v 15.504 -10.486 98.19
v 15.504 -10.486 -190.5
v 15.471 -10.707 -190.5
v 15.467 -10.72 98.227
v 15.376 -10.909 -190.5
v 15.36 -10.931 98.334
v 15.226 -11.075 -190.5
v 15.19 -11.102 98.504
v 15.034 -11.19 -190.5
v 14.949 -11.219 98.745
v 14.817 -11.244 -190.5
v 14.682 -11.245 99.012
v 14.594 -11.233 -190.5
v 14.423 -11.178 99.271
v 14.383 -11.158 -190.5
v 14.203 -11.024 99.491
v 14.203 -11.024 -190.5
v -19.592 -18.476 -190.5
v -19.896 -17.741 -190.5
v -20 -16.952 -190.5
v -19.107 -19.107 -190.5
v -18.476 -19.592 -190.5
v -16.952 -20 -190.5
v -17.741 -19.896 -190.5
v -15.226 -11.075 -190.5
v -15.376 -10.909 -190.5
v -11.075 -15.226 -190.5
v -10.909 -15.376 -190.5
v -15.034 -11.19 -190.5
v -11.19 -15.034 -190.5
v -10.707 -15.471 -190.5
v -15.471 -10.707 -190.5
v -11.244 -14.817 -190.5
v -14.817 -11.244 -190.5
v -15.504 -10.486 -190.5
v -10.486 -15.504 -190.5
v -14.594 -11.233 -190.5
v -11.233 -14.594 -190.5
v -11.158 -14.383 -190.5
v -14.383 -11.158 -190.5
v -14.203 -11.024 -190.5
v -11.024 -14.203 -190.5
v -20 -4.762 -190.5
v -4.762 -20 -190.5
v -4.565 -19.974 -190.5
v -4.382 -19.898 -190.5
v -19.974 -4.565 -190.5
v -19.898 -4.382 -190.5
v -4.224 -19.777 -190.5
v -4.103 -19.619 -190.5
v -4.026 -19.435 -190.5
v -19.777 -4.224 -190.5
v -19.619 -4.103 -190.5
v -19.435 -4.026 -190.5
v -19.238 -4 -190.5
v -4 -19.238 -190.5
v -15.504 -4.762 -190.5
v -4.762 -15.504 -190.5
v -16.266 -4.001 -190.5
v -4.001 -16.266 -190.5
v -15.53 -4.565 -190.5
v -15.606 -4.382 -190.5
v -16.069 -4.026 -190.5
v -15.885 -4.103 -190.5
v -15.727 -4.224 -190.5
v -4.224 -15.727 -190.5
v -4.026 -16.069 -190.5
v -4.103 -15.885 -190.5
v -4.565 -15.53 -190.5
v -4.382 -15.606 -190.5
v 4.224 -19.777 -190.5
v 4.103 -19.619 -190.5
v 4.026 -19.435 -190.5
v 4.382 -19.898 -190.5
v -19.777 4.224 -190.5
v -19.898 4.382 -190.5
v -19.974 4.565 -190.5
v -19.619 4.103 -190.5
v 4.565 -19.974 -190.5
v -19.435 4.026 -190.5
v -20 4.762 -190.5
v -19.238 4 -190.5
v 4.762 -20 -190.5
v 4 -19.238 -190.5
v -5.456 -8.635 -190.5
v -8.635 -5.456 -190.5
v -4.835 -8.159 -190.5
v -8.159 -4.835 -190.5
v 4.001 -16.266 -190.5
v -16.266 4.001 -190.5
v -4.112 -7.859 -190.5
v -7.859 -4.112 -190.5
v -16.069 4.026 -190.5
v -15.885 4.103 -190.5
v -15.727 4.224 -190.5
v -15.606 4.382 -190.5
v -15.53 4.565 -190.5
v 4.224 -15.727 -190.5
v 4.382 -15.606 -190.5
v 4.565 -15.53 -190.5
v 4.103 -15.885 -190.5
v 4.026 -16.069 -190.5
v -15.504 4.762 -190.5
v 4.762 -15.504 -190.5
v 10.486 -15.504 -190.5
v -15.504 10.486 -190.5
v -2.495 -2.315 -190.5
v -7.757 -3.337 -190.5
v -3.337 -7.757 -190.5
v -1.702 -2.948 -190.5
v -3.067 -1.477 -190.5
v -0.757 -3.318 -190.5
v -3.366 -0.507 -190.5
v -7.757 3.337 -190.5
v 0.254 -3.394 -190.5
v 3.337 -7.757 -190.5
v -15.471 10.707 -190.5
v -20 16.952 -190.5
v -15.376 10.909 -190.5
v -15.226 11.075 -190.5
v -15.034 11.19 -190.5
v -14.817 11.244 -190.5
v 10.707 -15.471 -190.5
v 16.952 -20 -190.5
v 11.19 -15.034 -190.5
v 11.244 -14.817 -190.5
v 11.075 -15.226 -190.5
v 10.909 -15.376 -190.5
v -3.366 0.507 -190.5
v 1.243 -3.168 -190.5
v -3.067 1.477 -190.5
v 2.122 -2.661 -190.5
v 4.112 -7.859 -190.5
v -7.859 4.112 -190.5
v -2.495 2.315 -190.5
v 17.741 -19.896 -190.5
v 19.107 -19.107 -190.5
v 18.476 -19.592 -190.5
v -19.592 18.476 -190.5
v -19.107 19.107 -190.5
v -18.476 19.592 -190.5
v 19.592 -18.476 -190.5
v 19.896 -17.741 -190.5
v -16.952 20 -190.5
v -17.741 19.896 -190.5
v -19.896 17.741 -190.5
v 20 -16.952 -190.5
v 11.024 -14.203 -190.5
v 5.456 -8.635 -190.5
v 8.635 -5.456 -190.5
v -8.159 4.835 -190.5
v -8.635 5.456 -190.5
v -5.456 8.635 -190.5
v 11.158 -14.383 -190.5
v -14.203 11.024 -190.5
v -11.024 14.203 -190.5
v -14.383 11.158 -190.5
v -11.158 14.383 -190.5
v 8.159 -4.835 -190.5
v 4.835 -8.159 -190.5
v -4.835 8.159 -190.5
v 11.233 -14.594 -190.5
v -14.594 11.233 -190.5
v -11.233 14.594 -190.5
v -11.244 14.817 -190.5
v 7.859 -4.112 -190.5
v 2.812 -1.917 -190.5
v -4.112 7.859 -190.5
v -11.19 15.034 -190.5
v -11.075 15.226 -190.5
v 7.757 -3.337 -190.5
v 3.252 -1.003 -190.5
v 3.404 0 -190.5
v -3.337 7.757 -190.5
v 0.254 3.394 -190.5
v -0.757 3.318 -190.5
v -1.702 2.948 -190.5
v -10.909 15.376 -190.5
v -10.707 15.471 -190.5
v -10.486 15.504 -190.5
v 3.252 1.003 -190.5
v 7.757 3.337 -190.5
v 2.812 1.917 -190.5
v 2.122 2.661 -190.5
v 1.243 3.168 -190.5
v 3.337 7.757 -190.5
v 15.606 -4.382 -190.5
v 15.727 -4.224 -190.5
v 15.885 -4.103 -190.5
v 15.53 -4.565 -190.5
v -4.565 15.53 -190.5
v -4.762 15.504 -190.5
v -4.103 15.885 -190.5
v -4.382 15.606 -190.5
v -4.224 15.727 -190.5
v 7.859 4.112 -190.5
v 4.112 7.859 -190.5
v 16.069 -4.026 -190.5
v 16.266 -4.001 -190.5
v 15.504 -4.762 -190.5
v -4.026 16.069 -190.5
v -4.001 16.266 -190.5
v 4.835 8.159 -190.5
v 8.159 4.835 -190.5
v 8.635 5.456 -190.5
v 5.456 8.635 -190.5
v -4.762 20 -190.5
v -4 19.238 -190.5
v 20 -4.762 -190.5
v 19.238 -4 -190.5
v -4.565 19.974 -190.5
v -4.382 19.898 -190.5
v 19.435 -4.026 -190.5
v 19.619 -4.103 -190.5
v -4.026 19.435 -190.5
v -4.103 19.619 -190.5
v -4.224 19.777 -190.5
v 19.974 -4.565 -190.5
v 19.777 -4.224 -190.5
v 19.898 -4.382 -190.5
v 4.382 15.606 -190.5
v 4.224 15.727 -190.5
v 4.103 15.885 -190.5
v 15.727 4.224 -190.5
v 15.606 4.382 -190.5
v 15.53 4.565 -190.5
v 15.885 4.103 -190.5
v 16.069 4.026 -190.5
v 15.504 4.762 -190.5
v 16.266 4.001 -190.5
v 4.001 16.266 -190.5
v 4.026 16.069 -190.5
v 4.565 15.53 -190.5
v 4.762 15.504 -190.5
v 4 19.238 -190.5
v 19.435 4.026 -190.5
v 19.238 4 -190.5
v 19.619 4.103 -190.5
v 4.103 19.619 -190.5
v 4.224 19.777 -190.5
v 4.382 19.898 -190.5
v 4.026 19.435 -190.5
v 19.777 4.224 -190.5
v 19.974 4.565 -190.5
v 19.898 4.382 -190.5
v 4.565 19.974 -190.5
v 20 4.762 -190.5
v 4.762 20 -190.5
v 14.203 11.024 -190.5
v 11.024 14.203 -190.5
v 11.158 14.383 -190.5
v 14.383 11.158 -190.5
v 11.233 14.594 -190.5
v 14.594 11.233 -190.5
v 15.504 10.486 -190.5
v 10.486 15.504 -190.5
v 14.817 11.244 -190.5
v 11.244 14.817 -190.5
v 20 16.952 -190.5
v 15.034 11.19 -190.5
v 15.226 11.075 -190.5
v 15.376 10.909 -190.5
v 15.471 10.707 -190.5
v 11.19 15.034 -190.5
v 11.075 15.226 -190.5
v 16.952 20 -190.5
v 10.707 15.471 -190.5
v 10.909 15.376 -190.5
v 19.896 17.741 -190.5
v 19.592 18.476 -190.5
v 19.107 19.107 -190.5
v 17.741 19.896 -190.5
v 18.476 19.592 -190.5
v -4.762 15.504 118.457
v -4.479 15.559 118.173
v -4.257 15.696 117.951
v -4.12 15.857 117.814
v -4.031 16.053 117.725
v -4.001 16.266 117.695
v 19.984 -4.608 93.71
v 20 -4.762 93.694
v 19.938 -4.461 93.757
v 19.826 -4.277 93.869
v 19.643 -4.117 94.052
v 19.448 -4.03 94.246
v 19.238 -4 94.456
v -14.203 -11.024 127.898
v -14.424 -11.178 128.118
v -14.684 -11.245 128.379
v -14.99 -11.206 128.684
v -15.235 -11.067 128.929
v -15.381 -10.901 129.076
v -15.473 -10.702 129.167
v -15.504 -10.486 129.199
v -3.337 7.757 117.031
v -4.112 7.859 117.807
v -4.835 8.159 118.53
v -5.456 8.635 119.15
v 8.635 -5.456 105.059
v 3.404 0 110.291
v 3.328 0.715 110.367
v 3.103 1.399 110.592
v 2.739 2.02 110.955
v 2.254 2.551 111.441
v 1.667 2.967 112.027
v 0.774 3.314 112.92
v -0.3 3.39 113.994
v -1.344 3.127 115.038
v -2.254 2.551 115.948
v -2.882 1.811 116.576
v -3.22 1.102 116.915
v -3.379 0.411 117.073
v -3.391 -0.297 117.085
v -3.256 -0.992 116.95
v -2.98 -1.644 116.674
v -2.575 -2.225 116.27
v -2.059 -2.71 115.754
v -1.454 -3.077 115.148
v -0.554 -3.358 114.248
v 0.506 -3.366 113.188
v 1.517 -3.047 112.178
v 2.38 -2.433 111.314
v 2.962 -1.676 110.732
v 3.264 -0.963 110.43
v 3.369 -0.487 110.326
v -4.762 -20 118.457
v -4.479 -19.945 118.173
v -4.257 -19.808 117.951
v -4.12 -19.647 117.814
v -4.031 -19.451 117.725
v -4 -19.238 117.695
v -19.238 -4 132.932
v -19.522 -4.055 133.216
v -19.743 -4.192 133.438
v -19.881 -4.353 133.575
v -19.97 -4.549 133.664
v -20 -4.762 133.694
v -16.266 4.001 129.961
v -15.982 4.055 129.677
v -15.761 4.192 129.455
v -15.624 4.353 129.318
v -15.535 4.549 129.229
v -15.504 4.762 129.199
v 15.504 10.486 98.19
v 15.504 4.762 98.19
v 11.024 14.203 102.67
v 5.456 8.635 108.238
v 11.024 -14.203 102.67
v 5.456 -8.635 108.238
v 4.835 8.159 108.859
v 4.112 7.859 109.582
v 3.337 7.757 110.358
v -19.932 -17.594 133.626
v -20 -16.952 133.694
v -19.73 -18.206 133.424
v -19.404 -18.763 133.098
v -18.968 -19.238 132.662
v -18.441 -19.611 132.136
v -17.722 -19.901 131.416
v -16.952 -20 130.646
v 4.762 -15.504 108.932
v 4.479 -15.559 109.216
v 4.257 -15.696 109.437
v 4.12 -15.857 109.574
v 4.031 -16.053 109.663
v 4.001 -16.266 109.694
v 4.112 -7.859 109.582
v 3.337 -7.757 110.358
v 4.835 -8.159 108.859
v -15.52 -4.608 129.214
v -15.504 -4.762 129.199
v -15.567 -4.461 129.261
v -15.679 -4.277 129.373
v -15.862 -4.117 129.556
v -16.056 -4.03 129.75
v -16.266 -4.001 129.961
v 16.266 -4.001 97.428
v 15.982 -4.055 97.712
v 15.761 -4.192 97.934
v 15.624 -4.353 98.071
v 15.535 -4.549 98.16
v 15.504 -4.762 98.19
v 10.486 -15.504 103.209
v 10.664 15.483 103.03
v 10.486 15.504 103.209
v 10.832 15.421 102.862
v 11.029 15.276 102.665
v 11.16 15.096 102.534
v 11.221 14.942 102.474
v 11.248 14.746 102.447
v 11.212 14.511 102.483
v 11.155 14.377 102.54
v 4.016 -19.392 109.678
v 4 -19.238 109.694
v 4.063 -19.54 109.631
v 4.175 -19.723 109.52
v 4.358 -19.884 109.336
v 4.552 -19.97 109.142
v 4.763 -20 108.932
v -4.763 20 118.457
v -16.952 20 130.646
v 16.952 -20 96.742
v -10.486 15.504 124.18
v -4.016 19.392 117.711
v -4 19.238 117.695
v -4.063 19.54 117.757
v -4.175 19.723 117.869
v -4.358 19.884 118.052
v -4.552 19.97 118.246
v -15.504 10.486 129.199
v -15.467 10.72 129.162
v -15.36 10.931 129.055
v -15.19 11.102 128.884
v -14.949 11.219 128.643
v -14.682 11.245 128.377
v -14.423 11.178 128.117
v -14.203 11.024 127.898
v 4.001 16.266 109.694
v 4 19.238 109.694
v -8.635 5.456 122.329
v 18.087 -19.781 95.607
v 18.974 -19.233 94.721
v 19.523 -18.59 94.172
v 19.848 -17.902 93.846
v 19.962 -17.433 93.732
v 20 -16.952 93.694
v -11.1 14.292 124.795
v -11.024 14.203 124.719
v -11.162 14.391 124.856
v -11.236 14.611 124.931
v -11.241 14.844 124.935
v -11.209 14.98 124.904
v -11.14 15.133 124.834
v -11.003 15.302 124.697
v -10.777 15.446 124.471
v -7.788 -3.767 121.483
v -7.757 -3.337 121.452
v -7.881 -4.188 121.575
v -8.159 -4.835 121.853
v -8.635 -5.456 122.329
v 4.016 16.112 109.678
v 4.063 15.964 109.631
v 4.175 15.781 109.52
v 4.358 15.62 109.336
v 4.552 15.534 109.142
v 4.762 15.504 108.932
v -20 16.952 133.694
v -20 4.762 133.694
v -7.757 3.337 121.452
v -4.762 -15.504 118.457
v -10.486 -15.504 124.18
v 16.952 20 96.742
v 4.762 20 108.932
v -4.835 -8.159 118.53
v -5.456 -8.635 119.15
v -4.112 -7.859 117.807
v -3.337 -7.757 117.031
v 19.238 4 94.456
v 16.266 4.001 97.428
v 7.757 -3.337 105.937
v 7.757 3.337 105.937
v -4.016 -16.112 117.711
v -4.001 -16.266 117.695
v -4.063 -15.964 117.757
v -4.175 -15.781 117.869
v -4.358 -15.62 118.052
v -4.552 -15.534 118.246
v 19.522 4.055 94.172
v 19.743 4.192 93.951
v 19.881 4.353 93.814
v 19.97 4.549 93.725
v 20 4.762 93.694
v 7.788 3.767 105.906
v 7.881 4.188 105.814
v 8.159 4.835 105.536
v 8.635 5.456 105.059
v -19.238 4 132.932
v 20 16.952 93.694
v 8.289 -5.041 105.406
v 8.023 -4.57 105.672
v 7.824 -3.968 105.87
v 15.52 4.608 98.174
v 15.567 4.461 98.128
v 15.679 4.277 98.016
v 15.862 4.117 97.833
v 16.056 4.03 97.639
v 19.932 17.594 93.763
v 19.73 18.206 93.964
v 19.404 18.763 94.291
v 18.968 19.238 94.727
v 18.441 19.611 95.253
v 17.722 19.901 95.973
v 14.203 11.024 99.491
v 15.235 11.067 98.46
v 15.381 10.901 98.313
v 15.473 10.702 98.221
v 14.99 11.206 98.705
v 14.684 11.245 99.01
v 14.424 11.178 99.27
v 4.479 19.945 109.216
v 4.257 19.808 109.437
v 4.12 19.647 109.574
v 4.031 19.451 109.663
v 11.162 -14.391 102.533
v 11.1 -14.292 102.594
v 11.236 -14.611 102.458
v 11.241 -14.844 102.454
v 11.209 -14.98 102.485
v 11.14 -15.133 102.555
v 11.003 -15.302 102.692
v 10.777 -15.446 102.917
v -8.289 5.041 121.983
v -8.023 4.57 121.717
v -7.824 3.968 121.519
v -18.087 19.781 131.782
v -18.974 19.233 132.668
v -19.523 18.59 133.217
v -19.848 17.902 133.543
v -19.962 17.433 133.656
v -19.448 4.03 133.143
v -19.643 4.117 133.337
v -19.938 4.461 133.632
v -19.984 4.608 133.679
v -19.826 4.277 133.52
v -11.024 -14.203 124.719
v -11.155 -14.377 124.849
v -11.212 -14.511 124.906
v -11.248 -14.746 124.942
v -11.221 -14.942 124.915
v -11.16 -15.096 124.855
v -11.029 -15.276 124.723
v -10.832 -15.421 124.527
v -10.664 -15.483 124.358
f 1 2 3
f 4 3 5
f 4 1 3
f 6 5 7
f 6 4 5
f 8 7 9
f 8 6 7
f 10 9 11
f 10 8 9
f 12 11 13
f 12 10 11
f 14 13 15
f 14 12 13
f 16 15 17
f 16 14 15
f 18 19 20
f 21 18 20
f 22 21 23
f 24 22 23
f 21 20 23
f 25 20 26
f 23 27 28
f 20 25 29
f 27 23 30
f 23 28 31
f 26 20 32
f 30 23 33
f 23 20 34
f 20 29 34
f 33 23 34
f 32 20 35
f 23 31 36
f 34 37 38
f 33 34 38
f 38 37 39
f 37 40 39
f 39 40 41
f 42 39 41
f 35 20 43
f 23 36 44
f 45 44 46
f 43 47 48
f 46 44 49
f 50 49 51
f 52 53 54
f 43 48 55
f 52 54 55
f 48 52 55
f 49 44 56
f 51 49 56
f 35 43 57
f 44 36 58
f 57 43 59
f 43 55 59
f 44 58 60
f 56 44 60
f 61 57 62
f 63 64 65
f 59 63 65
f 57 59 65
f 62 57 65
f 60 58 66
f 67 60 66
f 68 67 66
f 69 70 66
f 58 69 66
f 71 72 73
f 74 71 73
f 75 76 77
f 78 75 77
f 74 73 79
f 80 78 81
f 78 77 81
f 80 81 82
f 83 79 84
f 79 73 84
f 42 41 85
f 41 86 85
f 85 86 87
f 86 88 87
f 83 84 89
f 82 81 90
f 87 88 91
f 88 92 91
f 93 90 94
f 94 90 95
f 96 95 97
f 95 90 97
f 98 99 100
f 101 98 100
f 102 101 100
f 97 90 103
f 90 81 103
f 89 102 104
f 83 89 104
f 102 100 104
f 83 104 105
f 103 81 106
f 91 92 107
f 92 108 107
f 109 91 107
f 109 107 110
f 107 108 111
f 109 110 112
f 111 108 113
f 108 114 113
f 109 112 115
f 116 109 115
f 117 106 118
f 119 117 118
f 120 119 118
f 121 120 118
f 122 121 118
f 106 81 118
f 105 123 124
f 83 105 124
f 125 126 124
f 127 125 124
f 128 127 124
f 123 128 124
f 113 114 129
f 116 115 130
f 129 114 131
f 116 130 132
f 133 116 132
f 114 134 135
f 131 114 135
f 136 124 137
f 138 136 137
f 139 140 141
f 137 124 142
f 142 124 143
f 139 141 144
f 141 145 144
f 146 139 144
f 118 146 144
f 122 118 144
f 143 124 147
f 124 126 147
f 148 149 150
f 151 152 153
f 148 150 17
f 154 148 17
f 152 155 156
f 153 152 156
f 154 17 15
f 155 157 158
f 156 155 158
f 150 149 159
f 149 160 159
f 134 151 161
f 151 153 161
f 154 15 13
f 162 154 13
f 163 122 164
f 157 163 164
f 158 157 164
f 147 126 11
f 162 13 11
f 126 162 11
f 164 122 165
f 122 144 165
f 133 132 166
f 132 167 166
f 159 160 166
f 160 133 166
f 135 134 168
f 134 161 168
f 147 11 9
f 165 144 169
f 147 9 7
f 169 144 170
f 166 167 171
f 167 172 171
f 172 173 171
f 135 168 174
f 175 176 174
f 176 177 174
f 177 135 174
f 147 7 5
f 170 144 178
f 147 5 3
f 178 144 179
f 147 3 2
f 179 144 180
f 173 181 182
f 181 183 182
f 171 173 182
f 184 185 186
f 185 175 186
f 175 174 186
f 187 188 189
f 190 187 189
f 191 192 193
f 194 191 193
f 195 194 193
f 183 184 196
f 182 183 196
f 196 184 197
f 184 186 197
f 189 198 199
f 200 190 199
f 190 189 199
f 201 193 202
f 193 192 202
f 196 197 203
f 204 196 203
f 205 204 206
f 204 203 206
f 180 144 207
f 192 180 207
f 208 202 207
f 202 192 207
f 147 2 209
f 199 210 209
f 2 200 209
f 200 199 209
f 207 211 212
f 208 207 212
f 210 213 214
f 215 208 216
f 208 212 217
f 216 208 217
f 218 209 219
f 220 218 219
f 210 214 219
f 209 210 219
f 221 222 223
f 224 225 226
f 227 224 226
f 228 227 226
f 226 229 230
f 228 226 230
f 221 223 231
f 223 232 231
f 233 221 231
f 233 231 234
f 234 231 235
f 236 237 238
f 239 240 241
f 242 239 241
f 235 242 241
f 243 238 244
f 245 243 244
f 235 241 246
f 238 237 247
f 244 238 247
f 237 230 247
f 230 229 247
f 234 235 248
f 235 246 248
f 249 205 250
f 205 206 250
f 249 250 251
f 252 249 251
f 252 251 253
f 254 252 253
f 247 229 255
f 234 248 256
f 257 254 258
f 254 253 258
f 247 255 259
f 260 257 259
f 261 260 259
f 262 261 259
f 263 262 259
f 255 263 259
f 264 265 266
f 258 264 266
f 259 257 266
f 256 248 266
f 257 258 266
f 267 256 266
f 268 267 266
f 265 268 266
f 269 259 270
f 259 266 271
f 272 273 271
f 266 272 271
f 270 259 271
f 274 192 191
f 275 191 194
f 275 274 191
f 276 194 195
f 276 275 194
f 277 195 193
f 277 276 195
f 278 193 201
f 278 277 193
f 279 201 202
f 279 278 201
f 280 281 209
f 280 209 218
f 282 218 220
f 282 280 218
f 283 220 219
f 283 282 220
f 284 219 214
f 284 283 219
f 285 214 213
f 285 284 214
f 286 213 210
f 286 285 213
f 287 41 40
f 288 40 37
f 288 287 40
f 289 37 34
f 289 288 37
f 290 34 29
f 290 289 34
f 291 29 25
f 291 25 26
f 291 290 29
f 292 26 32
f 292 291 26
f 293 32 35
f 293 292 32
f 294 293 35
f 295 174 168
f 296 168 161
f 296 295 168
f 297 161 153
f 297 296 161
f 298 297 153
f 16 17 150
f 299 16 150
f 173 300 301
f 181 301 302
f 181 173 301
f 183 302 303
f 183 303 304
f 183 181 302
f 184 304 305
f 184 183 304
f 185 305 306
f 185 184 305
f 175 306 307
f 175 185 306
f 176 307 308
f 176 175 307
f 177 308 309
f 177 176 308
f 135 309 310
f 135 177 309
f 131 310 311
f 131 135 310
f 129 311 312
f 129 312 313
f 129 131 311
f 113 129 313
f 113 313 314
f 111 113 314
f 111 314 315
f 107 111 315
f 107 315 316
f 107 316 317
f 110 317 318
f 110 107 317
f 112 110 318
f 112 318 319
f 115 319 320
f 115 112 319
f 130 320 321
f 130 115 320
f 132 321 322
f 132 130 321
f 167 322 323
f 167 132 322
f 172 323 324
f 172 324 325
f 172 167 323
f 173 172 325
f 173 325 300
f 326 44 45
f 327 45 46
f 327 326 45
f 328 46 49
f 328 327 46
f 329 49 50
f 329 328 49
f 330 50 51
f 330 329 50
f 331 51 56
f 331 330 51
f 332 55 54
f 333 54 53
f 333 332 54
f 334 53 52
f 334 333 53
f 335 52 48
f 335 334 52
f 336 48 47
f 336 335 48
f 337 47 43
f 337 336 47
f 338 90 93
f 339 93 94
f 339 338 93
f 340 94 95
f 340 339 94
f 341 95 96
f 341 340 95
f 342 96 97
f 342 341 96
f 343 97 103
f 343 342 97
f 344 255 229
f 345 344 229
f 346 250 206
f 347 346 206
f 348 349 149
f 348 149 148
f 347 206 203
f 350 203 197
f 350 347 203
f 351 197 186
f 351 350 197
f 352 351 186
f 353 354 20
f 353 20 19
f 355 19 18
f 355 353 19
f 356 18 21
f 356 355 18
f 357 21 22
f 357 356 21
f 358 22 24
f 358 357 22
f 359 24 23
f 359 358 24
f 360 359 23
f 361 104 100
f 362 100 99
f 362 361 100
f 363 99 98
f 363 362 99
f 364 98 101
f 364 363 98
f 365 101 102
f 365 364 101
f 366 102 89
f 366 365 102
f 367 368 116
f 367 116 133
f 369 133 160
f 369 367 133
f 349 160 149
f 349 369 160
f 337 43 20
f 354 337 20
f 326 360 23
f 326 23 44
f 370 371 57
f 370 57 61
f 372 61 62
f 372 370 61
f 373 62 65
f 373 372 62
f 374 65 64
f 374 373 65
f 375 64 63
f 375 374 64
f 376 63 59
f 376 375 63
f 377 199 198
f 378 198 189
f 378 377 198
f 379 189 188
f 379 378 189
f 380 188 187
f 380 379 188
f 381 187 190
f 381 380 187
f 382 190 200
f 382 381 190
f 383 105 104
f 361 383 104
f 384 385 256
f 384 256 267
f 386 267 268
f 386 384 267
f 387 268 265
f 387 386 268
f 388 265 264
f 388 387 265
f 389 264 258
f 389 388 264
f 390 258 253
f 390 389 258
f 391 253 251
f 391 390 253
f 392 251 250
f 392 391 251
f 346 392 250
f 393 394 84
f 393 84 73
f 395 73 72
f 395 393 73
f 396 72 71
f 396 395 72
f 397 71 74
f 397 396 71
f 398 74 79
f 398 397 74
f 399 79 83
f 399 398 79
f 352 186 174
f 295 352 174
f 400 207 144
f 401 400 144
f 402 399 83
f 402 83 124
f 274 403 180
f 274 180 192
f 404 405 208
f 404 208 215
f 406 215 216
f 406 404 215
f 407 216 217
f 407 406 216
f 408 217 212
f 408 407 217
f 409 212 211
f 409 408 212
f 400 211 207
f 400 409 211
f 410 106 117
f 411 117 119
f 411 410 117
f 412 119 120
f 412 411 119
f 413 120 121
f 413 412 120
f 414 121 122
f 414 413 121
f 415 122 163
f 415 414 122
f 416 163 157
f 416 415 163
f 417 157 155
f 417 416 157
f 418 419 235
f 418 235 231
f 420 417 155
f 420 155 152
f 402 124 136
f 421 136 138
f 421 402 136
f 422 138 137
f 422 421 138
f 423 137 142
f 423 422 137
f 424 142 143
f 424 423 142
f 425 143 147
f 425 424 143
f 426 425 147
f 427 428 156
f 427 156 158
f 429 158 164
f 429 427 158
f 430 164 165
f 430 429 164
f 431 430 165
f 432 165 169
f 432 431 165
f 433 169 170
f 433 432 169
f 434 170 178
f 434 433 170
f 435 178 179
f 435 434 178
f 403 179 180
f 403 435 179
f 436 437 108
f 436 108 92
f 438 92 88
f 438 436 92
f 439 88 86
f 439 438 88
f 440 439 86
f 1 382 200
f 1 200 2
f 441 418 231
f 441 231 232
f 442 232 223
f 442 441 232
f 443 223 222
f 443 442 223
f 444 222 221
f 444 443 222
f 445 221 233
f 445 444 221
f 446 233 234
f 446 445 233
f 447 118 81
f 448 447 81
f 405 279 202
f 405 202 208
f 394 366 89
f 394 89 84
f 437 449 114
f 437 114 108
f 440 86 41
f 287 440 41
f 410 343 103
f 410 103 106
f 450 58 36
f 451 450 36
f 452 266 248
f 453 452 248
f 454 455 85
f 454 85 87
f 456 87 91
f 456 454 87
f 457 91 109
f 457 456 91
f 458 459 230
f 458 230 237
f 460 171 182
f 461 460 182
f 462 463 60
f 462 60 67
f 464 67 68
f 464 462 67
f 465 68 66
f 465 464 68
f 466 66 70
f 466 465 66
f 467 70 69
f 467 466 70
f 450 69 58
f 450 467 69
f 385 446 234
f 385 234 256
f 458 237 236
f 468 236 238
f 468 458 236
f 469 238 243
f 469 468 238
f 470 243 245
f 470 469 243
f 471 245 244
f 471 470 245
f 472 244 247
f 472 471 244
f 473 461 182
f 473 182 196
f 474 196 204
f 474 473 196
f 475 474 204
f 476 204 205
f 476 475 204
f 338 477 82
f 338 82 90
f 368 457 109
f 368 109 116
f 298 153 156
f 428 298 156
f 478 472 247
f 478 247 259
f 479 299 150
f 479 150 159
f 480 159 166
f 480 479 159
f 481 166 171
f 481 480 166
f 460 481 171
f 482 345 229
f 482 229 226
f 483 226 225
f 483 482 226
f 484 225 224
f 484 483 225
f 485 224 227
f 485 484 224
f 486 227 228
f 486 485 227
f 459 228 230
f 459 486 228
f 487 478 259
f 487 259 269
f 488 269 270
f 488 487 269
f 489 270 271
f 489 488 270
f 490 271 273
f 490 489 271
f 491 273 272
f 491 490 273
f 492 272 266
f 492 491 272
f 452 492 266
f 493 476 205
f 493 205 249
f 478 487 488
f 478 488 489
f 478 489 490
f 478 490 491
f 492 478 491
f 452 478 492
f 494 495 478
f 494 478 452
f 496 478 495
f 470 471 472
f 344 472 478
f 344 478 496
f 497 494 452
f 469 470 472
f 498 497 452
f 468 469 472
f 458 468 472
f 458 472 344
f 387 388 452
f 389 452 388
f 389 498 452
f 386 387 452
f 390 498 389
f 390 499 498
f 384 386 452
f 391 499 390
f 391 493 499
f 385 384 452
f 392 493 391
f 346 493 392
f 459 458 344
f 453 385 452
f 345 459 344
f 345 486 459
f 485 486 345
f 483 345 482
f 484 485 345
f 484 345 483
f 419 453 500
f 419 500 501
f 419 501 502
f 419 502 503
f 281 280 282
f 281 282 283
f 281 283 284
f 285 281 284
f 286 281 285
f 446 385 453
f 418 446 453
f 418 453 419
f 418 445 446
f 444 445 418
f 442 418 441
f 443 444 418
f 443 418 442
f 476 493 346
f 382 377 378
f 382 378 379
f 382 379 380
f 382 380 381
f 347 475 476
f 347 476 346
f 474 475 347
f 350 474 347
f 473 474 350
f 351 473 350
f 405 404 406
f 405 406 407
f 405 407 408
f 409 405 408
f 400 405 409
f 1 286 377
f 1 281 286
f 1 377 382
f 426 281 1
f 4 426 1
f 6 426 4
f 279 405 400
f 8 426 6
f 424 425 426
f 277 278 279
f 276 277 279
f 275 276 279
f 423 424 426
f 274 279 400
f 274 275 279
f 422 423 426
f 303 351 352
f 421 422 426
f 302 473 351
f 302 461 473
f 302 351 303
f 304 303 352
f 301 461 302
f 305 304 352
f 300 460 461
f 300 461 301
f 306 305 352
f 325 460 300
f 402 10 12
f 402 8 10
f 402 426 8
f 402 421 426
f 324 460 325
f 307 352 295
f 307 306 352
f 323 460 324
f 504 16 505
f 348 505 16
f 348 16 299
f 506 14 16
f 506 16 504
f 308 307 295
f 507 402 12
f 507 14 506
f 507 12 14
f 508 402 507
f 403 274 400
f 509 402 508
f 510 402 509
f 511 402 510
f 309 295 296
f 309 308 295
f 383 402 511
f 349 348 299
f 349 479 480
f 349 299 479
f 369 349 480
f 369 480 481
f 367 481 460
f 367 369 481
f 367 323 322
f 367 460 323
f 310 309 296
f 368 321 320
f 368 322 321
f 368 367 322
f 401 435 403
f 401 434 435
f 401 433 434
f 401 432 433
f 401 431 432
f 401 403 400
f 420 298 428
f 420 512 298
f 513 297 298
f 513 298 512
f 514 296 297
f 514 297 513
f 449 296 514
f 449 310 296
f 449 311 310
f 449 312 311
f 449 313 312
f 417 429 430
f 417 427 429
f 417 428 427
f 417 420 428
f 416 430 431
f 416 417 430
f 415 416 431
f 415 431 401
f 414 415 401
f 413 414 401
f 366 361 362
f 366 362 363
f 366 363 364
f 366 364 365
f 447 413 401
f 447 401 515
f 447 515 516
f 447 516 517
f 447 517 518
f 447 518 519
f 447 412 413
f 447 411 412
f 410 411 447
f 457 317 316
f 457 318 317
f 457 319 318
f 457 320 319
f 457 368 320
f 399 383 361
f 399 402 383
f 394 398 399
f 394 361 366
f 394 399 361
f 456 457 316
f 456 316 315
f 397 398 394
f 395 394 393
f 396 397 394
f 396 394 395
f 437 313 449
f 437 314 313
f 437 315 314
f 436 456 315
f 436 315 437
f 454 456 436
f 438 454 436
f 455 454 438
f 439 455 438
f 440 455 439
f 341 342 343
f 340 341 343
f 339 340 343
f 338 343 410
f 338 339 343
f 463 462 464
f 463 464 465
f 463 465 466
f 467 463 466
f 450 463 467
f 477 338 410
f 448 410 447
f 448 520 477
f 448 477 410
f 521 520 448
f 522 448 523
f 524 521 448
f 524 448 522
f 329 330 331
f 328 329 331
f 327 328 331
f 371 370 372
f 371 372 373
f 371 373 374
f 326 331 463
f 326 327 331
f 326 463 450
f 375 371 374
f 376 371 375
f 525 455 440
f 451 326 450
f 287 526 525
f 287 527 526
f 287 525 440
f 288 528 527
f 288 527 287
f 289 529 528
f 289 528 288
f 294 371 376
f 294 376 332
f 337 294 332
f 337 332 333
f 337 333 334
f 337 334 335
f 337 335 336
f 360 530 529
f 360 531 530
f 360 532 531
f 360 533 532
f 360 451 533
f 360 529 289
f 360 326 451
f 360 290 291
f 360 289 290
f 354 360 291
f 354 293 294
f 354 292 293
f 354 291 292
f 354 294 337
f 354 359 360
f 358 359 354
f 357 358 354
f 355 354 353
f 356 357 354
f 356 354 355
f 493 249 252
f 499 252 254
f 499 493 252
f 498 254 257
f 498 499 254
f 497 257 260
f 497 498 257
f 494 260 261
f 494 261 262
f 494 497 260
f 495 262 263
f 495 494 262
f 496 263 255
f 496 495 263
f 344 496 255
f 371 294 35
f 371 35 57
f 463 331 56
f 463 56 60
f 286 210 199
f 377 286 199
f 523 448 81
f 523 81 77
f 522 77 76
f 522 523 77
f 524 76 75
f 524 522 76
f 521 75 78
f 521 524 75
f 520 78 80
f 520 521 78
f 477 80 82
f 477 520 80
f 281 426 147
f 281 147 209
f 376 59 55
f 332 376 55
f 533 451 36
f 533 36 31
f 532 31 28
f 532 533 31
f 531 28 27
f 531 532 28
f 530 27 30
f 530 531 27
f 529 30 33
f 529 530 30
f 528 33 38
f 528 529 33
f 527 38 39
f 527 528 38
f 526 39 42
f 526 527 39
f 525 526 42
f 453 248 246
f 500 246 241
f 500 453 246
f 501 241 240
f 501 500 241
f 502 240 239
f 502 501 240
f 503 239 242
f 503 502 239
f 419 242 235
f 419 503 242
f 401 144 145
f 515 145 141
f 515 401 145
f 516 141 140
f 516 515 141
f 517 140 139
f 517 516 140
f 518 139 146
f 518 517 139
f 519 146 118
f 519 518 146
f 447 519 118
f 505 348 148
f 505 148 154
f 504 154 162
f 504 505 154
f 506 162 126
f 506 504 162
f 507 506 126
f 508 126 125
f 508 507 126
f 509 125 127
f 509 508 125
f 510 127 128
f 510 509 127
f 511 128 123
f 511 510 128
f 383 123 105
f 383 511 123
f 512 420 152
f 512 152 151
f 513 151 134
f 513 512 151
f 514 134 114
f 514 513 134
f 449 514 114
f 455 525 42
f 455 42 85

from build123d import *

# Parameters (mm, degrees)
SKETCH1_R          = 3.4036
EXTRUDE1_DEPTH     = 190.5
CUT_EXTRUDE1_REACH = 197.079
CUT_EXTRUDE2_DEPTH = 3.048


with BuildPart() as part:
    # Sketch1 → Extrude1 (new, symmetric)
    with BuildSketch(Plane.XY):
        with BuildLine():
            Line((-20, 16.952), (-20, 4.7625))
            ThreePointArc((-20, 4.7625), (-19.776815367, 4.223684633), (-19.238, 4.0005))
            Line((-19.238, 4.0005), (-16.2662, 4.0005))
            ThreePointArc((-16.2662, 4.0005), (-15.727384633, 4.223684633), (-15.5042, 4.7625))
            Line((-15.5042, 4.7625), (-15.5042, 10.485558599))
            ThreePointArc((-15.5042, 10.485558599), (-15.033804775, 11.189554802), (-14.203384633, 11.024373966))
            Line((-14.203384633, 11.024373966), (-8.635059555, 5.456048889))
            ThreePointArc((-8.635059555, 5.456048889), (-7.985348265, 4.483687227), (-7.7572, 3.336708444))
            Line((-7.7572, 3.336708444), (-7.7572, -3.336708444))
            ThreePointArc((-7.7572, -3.336708444), (-7.985348265, -4.483687227), (-8.635059555, -5.456048889))
            Line((-8.635059555, -5.456048889), (-14.203384633, -11.024373966))
            ThreePointArc((-14.203384633, -11.024373966), (-15.033804775, -11.189554802), (-15.5042, -10.485558599))
            Line((-15.5042, -10.485558599), (-15.5042, -4.7625))
            ThreePointArc((-15.5042, -4.7625), (-15.727384633, -4.223684633), (-16.2662, -4.0005))
            Line((-16.2662, -4.0005), (-19.238, -4.0005))
            ThreePointArc((-19.238, -4.0005), (-19.776815367, -4.223684633), (-20, -4.7625))
            Line((-20, -4.7625), (-20, -16.952))
            ThreePointArc((-20, -16.952), (-19.107261469, -19.107261469), (-16.952, -20))
            Line((-16.952, -20), (-4.7625, -20))
            ThreePointArc((-4.7625, -20), (-4.223684633, -19.776815367), (-4.0005, -19.238))
            Line((-4.0005, -19.238), (-4.0005, -16.2662))
            ThreePointArc((-4.0005, -16.2662), (-4.223684633, -15.727384633), (-4.7625, -15.5042))
            Line((-4.7625, -15.5042), (-10.485558599, -15.5042))
            ThreePointArc((-10.485558599, -15.5042), (-11.189554802, -15.033804775), (-11.024373966, -14.203384633))
            Line((-11.024373966, -14.203384633), (-5.456048889, -8.635059555))
            ThreePointArc((-5.456048889, -8.635059555), (-4.483687227, -7.985348265), (-3.336708444, -7.7572))
            Line((-3.336708444, -7.7572), (3.336708444, -7.7572))
            ThreePointArc((3.336708444, -7.7572), (4.483687227, -7.985348265), (5.456048889, -8.635059555))
            Line((5.456048889, -8.635059555), (11.024373966, -14.203384633))
            ThreePointArc((11.024373966, -14.203384633), (11.189554802, -15.033804775), (10.485558599, -15.5042))
            Line((10.485558599, -15.5042), (4.7625, -15.5042))
            ThreePointArc((4.7625, -15.5042), (4.223684633, -15.727384633), (4.0005, -16.2662))
            Line((4.0005, -16.2662), (4.0005, -19.238))
            ThreePointArc((4.0005, -19.238), (4.223684633, -19.776815367), (4.7625, -20))
            Line((4.7625, -20), (16.952, -20))
            ThreePointArc((16.952, -20), (19.107261469, -19.107261469), (20, -16.952))
            Line((20, -16.952), (20, -4.7625))
            ThreePointArc((20, -4.7625), (19.776815367, -4.223684633), (19.238, -4.0005))
            Line((19.238, -4.0005), (16.2662, -4.0005))
            ThreePointArc((16.2662, -4.0005), (15.727384633, -4.223684633), (15.5042, -4.7625))
            Line((15.5042, -4.7625), (15.5042, -10.485558599))
            ThreePointArc((15.5042, -10.485558599), (15.033804775, -11.189554802), (14.203384633, -11.024373966))
            Line((14.203384633, -11.024373966), (8.635059555, -5.456048889))
            ThreePointArc((8.635059555, -5.456048889), (7.985348265, -4.483687227), (7.7572, -3.336708444))
            Line((7.7572, -3.336708444), (7.7572, 3.336708444))
            ThreePointArc((7.7572, 3.336708444), (7.985348265, 4.483687227), (8.635059555, 5.456048889))
            Line((8.635059555, 5.456048889), (14.203384633, 11.024373966))
            ThreePointArc((14.203384633, 11.024373966), (15.033804775, 11.189554802), (15.5042, 10.485558599))
            Line((15.5042, 10.485558599), (15.5042, 4.7625))
            ThreePointArc((15.5042, 4.7625), (15.727384633, 4.223684633), (16.2662, 4.0005))
            Line((16.2662, 4.0005), (19.238, 4.0005))
            ThreePointArc((19.238, 4.0005), (19.776815367, 4.223684633), (20, 4.7625))
            Line((20, 4.7625), (20, 16.952))
            ThreePointArc((20, 16.952), (19.107261469, 19.107261469), (16.952, 20))
            Line((16.952, 20), (4.7625, 20))
            ThreePointArc((4.7625, 20), (4.223684633, 19.776815367), (4.0005, 19.238))
            Line((4.0005, 19.238), (4.0005, 16.2662))
            ThreePointArc((4.0005, 16.2662), (4.223684633, 15.727384633), (4.7625, 15.5042))
            Line((4.7625, 15.5042), (10.485558599, 15.5042))
            ThreePointArc((10.485558599, 15.5042), (11.189554802, 15.033804775), (11.024373966, 14.203384633))
            Line((11.024373966, 14.203384633), (5.456048889, 8.635059555))
            ThreePointArc((5.456048889, 8.635059555), (4.483687227, 7.985348265), (3.336708444, 7.7572))
            Line((3.336708444, 7.7572), (-3.336708444, 7.7572))
            ThreePointArc((-3.336708444, 7.7572), (-4.483687227, 7.985348265), (-5.456048889, 8.635059555))
            Line((-5.456048889, 8.635059555), (-11.024373966, 14.203384633))
            ThreePointArc((-11.024373966, 14.203384633), (-11.189554802, 15.033804775), (-10.485558599, 15.5042))
            Line((-10.485558599, 15.5042), (-4.7625, 15.5042))
            ThreePointArc((-4.7625, 15.5042), (-4.223684633, 15.727384633), (-4.0005, 16.2662))
            Line((-4.0005, 16.2662), (-4.0005, 19.238))
            ThreePointArc((-4.0005, 19.238), (-4.223684633, 19.776815367), (-4.7625, 20))
            Line((-4.7625, 20), (-16.952, 20))
            ThreePointArc((-16.952, 20), (-19.107261469, 19.107261469), (-20, 16.952))
        make_face()
        Circle(SKETCH1_R, mode=Mode.SUBTRACT)
    extrude(amount=EXTRUDE1_DEPTH, both=True)

    # Cut-Extrude1: up to this face of the body (flat: up to its plane)
    cut_extrude1_end = Plane(part.part.faces().sort_by_distance((-10.85725, 20, 0))[0])
    # Sketch6 → Cut-Extrude1 (cut, up to the picked face)
    with BuildSketch(Plane(origin=(0, -16.952, 0), x_dir=(-1, 0, 0), z_dir=(0, -1, 0)), mode=Mode.PRIVATE) as cut_extrude1_sk1:
        Polygon((-20, -93.69431704), (20, -133.69431704), (20, -190.5), (-20, -190.5), align=None)
    cut_extrude1_tool1 = split(extrude(cut_extrude1_sk1.sketch, amount=-CUT_EXTRUDE1_REACH, mode=Mode.PRIVATE), bisect_by=cut_extrude1_end, keep=Keep.BOTH, mode=Mode.PRIVATE)
    add(cut_extrude1_tool1.solids().sort_by(Axis((1.735983, -16.952, 151.229167), (0, 1, 0)))[0], mode=Mode.SUBTRACT)

    # Sketch7 → Cut-Extrude2 (cut)
    with BuildSketch(Plane(origin=(0, -16.952, 0), x_dir=(1, 0, 0), z_dir=(0, 1, 0))):
        Polygon((-20, -133.69431704), (20, -93.69431704), (20, -190.5), (-20, -190.5), align=None)
    extrude(amount=-CUT_EXTRUDE2_DEPTH, mode=Mode.SUBTRACT)


solid = part.part
